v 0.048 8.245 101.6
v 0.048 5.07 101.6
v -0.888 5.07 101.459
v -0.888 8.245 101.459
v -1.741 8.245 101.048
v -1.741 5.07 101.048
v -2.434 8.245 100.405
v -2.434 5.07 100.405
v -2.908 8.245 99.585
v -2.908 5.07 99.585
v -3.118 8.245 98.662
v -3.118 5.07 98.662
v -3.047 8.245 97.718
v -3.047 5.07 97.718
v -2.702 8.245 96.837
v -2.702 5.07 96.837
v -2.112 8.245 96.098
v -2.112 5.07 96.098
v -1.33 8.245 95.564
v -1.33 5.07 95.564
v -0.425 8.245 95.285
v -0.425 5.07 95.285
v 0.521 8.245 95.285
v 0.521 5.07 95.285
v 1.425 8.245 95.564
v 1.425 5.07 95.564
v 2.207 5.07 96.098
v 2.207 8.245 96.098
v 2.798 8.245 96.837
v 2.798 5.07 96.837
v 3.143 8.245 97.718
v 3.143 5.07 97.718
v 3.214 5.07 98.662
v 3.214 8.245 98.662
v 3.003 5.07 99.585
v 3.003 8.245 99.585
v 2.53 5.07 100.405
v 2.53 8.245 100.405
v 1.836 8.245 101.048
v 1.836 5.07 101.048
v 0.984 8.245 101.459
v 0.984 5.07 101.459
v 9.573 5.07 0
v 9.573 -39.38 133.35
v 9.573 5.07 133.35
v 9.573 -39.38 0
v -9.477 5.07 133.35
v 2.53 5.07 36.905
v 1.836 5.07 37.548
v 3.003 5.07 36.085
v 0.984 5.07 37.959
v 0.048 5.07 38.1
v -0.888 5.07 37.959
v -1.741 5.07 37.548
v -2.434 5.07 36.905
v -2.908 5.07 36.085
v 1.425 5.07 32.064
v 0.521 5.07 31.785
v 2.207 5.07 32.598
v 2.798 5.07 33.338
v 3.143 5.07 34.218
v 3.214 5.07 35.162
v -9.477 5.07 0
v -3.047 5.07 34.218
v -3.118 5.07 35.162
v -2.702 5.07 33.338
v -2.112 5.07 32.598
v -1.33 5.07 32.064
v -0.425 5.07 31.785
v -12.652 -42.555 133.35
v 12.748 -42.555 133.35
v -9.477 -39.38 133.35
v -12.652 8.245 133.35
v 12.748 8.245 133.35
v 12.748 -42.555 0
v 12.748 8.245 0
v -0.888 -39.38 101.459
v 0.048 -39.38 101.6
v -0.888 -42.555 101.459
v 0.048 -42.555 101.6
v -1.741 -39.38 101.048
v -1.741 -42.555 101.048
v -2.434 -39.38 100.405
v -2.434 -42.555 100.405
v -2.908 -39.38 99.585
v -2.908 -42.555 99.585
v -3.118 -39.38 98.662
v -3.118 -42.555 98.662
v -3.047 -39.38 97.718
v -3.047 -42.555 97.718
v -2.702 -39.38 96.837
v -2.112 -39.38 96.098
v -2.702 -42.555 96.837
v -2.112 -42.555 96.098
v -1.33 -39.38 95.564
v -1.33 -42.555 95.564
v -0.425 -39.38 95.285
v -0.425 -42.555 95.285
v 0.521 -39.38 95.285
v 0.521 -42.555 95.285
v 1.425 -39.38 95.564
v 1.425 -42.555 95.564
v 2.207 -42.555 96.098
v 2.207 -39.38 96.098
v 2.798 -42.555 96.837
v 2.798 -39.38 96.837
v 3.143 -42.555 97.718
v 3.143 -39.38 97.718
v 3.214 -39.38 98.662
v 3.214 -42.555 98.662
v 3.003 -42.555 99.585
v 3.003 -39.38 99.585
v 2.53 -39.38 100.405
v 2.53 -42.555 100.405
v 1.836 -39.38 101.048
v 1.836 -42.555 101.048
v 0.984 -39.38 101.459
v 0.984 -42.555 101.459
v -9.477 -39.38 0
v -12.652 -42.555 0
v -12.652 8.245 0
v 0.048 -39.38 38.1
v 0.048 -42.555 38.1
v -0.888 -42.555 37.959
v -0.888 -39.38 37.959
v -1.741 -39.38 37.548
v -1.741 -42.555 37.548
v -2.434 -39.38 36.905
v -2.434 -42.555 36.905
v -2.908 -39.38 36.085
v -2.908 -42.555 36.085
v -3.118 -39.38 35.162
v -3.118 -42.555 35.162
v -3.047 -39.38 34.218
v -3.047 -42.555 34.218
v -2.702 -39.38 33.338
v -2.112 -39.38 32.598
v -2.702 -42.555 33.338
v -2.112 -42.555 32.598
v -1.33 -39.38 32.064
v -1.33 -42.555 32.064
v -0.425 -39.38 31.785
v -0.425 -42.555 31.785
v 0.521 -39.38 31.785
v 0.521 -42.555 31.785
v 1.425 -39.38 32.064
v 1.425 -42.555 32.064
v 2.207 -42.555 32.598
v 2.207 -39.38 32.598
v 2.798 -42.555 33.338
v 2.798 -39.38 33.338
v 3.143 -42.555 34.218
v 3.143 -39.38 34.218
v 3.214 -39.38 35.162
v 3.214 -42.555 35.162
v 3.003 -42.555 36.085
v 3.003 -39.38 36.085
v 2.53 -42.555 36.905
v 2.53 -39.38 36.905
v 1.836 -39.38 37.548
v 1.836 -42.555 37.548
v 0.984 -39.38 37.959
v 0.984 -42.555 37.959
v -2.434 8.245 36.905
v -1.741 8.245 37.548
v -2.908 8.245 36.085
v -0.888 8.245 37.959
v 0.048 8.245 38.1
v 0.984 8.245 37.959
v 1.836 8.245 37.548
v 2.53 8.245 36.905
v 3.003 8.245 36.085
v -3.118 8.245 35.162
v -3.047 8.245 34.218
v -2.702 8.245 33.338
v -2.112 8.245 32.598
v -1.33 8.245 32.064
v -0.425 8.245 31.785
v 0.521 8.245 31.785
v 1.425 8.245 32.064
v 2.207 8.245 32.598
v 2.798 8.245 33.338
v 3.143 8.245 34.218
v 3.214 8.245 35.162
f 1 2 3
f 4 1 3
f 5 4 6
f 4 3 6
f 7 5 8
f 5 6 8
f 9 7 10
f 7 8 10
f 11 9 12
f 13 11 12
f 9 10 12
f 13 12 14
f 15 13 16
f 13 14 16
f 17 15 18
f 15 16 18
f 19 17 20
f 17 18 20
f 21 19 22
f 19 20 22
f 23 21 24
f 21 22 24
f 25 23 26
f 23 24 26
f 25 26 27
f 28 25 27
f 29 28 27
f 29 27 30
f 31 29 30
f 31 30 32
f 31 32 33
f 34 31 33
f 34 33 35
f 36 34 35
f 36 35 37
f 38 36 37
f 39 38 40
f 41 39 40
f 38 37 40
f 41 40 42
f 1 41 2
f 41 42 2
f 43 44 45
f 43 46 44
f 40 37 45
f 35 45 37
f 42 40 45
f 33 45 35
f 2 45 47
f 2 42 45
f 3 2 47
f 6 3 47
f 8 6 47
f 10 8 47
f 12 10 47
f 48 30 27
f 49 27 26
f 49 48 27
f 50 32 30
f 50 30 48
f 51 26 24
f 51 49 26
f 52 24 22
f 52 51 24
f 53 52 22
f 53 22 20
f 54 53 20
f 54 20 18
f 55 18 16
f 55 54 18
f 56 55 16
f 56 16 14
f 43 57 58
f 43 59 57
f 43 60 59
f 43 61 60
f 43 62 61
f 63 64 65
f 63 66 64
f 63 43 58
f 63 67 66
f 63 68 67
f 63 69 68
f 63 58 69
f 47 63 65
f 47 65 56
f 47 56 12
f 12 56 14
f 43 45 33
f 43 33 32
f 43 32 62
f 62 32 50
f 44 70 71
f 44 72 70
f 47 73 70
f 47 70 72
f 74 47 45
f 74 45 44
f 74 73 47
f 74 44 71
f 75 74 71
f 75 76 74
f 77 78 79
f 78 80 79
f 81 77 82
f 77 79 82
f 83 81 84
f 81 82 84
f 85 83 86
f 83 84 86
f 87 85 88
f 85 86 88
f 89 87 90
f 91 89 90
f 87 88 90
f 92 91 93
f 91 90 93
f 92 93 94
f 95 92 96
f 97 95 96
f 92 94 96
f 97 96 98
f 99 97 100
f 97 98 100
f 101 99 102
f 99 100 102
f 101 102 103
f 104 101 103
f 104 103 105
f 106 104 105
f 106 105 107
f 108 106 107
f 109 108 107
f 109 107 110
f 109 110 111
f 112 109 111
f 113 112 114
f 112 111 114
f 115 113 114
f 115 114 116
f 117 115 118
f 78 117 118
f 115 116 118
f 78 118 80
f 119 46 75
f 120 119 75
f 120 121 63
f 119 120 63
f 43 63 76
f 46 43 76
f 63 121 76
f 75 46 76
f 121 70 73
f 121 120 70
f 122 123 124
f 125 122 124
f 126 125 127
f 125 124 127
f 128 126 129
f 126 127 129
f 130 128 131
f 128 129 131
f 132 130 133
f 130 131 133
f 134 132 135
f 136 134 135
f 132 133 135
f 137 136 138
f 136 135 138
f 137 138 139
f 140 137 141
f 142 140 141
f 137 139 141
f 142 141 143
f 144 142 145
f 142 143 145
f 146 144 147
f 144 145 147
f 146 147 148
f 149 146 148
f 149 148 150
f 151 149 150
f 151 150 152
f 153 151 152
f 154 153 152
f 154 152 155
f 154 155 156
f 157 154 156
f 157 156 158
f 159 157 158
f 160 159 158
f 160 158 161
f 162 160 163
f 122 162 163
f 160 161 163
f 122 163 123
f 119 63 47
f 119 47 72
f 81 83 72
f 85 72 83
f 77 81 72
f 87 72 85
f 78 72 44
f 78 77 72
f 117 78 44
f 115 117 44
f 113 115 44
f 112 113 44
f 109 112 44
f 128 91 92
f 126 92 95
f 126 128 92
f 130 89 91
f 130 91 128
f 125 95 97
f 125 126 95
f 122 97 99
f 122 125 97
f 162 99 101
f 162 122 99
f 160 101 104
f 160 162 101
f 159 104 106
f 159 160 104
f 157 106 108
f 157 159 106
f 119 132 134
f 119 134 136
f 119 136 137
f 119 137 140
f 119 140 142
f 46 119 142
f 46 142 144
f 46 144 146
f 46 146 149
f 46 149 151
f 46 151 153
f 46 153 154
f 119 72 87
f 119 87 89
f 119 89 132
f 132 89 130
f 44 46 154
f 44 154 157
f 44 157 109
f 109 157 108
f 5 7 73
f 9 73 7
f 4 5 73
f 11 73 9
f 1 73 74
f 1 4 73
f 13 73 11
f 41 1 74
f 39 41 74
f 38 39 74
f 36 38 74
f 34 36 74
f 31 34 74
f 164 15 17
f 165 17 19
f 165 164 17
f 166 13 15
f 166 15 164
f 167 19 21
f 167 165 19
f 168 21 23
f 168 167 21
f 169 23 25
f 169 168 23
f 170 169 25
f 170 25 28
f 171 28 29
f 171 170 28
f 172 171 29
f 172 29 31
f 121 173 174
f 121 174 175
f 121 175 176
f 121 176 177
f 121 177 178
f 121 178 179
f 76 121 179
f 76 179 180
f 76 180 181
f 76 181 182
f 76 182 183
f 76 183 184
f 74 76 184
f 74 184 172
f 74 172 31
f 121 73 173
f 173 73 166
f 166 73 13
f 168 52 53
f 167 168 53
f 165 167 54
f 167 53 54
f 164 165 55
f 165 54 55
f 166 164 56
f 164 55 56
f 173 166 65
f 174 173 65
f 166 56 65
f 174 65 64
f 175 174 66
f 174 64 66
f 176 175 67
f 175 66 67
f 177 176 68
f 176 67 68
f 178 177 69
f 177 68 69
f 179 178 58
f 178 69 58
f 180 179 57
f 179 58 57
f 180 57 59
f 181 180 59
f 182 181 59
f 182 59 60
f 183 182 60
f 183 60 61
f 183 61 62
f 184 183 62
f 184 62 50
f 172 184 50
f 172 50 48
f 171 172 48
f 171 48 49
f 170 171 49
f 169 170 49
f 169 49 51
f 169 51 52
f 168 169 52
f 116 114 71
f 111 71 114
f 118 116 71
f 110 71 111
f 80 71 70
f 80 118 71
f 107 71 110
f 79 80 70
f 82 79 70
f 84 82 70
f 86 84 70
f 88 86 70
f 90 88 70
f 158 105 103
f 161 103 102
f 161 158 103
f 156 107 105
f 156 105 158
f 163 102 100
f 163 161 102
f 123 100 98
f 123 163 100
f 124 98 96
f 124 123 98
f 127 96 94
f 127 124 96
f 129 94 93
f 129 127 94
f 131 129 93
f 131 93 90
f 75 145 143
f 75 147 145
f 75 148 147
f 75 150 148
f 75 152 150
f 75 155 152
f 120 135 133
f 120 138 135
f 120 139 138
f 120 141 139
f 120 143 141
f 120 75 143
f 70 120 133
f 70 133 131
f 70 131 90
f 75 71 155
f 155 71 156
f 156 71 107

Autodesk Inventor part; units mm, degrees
ref_plane "YZ Plane" through (0, 0, 0) normal (1, 0, 0) x (0, 1, 0)
ref_plane "XZ Plane" through (0, 0, 0) normal (0, 1, 0) x (-1, 0, 0)
ref_plane "XY Plane" through (0, 0, 0) normal (0, 0, 1) x (1, 0, 0)
sketch "Sketch1" plane through (0, 0, 0) normal (0, 0, 1) x (1, 0, 0)
  line L0 (-12.6521, 8.2446) -> (12.7479, 8.2446)
  line L1 (12.7479, 8.2446) -> (12.7479, -42.5554)
  line L2 (12.7479, -42.5554) -> (-12.6521, -42.5554)
  line L3 (-12.6521, -42.5554) -> (-12.6521, 8.2446)
  line L4 (9.5729, 5.0696) -> (-9.4771, 5.0696)
  line L5 (-9.4771, 5.0696) -> (-9.4771, -39.3804)
  line L6 (-9.4771, -39.3804) -> (9.5729, -39.3804)
  line L7 (9.5729, -39.3804) -> (9.5729, 5.0696)
  point P0 (0, 0)
  dimension "d1" = 25.4
  dimension "d4" = 50.8
  dimension "d5" = 3.175
extrude "Extrusion1" add sketch "Sketch1" along normal blind 133.35
sketch "Sketch2" plane through (-12.6521, 8.2446, 0) normal (0, 1, 0) x (1, 0, 0)
  line L0 (25.4, 0) -> (25.4, -133.35) projected
  line L1 (25.4, -133.35) -> (0, -133.35) projected
  point P0 (12.6521, 0)
  point P1 (12.7, -34.925)
  point P2 (12.7, -98.425)
  dimension "d8" = 63.5
  dimension "d9" = 12.7
  dimension "d10" = 12.7
  dimension "d11" = 34.925
hole "Hole1" at (0.0479, 8.2446, 34.925) at (0.0479, 8.2446, 98.425) direction (0, -1, 0) diameter 6.35 end through all
properties part number "Motor Tension Block Mount"
